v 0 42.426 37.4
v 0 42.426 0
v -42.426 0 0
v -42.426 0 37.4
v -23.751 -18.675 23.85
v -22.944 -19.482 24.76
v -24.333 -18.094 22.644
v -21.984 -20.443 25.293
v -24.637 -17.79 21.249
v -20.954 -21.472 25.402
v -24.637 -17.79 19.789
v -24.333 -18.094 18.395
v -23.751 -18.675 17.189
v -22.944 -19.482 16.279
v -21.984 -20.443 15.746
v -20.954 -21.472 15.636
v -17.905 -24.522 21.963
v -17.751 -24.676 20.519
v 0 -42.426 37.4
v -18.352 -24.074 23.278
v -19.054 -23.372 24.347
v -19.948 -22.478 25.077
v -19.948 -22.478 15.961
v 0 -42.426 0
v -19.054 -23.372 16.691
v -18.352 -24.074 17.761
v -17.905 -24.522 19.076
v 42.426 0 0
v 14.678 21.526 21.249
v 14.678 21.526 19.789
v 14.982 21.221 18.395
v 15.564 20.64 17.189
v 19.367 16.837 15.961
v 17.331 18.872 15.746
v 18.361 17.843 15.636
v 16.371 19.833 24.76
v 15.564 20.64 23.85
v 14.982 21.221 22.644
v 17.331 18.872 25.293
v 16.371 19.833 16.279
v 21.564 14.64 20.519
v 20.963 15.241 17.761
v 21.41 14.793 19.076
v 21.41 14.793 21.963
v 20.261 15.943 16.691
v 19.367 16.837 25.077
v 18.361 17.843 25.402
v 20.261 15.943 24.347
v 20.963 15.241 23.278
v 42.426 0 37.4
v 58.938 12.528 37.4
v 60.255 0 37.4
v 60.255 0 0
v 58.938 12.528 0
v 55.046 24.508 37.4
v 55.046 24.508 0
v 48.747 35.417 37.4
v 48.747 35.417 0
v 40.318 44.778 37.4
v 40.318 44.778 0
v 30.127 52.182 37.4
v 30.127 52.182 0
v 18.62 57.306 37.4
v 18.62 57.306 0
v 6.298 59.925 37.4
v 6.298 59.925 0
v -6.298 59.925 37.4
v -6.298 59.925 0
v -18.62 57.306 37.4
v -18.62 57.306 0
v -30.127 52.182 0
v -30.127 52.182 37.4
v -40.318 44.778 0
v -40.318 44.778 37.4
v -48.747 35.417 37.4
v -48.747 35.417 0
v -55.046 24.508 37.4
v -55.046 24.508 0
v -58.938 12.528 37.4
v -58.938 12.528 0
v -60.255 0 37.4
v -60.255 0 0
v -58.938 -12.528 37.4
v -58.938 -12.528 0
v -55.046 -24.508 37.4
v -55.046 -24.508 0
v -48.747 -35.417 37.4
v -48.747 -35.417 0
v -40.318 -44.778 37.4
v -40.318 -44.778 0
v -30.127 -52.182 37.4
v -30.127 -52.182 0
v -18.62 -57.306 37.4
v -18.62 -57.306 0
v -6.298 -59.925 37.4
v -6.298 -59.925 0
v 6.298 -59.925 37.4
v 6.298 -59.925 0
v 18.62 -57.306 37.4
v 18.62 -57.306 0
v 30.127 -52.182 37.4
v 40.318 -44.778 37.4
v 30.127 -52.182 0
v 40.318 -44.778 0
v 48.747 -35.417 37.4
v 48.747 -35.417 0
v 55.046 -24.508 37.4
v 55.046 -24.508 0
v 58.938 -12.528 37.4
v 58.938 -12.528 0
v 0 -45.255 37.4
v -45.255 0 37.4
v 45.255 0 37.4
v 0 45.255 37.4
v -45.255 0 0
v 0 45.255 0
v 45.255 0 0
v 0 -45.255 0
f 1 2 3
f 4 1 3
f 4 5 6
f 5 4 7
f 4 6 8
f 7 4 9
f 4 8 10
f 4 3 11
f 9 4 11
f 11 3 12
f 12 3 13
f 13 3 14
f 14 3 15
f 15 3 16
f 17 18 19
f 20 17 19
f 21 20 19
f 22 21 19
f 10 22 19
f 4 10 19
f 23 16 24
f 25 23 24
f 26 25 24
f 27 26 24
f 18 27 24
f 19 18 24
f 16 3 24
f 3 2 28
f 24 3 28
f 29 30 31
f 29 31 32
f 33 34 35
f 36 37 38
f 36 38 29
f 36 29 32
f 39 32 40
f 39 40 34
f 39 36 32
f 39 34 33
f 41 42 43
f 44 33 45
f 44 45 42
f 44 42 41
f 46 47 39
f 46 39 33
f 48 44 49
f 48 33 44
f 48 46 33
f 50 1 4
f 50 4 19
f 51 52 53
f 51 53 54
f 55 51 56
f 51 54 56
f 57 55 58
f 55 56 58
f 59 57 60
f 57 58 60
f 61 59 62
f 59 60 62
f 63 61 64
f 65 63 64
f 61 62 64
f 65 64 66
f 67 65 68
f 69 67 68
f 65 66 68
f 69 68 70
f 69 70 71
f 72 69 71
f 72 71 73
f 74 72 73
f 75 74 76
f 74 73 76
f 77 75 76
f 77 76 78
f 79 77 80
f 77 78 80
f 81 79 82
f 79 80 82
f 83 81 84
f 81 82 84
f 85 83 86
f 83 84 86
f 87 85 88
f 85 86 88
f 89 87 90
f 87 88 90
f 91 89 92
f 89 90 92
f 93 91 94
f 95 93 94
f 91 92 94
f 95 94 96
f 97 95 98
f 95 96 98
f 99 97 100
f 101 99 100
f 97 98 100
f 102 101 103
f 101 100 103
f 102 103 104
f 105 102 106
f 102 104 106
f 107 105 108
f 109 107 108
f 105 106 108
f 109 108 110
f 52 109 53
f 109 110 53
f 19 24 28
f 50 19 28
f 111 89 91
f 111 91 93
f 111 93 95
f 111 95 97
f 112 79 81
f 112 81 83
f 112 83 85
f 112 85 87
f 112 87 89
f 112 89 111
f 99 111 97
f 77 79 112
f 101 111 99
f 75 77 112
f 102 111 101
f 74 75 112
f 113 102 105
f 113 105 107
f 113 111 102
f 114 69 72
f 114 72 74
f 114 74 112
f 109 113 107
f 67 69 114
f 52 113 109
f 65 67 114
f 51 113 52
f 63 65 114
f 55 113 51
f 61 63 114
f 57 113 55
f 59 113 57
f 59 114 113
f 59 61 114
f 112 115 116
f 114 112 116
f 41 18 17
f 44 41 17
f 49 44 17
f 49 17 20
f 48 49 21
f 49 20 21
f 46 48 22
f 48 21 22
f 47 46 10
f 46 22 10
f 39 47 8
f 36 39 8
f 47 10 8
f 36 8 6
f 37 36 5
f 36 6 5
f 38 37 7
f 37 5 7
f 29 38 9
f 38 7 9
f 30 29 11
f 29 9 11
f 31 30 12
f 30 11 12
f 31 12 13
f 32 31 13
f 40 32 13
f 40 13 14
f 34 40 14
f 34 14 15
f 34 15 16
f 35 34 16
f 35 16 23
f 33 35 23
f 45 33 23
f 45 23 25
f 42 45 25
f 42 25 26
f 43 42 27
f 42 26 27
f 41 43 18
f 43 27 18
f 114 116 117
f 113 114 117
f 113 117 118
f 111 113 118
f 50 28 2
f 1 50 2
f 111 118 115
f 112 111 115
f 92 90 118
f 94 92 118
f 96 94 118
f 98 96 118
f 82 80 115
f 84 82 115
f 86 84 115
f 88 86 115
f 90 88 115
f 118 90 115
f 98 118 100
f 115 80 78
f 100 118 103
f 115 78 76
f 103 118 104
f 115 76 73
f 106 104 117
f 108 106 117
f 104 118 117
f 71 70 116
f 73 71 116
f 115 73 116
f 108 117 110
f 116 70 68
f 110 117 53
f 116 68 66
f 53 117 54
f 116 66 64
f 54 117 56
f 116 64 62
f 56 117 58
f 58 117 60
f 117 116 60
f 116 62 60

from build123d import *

# Parameters (mm, degrees)
F1_DEPTH = 37.4
F2_R     = 4.8964779363
F3_DEPTH = 55.6
F4_R     = 60.2548339959
F5_DEPTH = 37.4


with BuildPart() as f1:
    # F0 (on Top) → F1 (new body)
    with BuildSketch(Plane.XY):
        Polygon((0, 42.4264068712), (-42.4264068712, 0), (0, -42.4264068712), (42.4264068712, 0), align=None)
    extrude(amount=F1_DEPTH)

    # F2 (on face) → F3 (cut)
    with BuildSketch(Plane(origin=(-21.2132034356, -21.2132034356, 0), x_dir=(0.7071067812, -0.7071067812, 0), z_dir=(-0.7071067812, -0.7071067812, 0))):
        with Locations((0, 20.5192621797)):
            Circle(F2_R)
    extrude(amount=-F3_DEPTH, mode=Mode.SUBTRACT)


with BuildPart() as f5:
    # F4 (on Top) → F5 (new body, through all)
    with BuildSketch(Plane.XY):
        Circle(F4_R)
        Polygon((45.2548339959, 0), (0, -45.2548339959), (-45.2548339959, 0), (0, 45.2548339959), align=None, mode=Mode.SUBTRACT)
    extrude(amount=F5_DEPTH)


solid = Compound([f1.part, f5.part])
